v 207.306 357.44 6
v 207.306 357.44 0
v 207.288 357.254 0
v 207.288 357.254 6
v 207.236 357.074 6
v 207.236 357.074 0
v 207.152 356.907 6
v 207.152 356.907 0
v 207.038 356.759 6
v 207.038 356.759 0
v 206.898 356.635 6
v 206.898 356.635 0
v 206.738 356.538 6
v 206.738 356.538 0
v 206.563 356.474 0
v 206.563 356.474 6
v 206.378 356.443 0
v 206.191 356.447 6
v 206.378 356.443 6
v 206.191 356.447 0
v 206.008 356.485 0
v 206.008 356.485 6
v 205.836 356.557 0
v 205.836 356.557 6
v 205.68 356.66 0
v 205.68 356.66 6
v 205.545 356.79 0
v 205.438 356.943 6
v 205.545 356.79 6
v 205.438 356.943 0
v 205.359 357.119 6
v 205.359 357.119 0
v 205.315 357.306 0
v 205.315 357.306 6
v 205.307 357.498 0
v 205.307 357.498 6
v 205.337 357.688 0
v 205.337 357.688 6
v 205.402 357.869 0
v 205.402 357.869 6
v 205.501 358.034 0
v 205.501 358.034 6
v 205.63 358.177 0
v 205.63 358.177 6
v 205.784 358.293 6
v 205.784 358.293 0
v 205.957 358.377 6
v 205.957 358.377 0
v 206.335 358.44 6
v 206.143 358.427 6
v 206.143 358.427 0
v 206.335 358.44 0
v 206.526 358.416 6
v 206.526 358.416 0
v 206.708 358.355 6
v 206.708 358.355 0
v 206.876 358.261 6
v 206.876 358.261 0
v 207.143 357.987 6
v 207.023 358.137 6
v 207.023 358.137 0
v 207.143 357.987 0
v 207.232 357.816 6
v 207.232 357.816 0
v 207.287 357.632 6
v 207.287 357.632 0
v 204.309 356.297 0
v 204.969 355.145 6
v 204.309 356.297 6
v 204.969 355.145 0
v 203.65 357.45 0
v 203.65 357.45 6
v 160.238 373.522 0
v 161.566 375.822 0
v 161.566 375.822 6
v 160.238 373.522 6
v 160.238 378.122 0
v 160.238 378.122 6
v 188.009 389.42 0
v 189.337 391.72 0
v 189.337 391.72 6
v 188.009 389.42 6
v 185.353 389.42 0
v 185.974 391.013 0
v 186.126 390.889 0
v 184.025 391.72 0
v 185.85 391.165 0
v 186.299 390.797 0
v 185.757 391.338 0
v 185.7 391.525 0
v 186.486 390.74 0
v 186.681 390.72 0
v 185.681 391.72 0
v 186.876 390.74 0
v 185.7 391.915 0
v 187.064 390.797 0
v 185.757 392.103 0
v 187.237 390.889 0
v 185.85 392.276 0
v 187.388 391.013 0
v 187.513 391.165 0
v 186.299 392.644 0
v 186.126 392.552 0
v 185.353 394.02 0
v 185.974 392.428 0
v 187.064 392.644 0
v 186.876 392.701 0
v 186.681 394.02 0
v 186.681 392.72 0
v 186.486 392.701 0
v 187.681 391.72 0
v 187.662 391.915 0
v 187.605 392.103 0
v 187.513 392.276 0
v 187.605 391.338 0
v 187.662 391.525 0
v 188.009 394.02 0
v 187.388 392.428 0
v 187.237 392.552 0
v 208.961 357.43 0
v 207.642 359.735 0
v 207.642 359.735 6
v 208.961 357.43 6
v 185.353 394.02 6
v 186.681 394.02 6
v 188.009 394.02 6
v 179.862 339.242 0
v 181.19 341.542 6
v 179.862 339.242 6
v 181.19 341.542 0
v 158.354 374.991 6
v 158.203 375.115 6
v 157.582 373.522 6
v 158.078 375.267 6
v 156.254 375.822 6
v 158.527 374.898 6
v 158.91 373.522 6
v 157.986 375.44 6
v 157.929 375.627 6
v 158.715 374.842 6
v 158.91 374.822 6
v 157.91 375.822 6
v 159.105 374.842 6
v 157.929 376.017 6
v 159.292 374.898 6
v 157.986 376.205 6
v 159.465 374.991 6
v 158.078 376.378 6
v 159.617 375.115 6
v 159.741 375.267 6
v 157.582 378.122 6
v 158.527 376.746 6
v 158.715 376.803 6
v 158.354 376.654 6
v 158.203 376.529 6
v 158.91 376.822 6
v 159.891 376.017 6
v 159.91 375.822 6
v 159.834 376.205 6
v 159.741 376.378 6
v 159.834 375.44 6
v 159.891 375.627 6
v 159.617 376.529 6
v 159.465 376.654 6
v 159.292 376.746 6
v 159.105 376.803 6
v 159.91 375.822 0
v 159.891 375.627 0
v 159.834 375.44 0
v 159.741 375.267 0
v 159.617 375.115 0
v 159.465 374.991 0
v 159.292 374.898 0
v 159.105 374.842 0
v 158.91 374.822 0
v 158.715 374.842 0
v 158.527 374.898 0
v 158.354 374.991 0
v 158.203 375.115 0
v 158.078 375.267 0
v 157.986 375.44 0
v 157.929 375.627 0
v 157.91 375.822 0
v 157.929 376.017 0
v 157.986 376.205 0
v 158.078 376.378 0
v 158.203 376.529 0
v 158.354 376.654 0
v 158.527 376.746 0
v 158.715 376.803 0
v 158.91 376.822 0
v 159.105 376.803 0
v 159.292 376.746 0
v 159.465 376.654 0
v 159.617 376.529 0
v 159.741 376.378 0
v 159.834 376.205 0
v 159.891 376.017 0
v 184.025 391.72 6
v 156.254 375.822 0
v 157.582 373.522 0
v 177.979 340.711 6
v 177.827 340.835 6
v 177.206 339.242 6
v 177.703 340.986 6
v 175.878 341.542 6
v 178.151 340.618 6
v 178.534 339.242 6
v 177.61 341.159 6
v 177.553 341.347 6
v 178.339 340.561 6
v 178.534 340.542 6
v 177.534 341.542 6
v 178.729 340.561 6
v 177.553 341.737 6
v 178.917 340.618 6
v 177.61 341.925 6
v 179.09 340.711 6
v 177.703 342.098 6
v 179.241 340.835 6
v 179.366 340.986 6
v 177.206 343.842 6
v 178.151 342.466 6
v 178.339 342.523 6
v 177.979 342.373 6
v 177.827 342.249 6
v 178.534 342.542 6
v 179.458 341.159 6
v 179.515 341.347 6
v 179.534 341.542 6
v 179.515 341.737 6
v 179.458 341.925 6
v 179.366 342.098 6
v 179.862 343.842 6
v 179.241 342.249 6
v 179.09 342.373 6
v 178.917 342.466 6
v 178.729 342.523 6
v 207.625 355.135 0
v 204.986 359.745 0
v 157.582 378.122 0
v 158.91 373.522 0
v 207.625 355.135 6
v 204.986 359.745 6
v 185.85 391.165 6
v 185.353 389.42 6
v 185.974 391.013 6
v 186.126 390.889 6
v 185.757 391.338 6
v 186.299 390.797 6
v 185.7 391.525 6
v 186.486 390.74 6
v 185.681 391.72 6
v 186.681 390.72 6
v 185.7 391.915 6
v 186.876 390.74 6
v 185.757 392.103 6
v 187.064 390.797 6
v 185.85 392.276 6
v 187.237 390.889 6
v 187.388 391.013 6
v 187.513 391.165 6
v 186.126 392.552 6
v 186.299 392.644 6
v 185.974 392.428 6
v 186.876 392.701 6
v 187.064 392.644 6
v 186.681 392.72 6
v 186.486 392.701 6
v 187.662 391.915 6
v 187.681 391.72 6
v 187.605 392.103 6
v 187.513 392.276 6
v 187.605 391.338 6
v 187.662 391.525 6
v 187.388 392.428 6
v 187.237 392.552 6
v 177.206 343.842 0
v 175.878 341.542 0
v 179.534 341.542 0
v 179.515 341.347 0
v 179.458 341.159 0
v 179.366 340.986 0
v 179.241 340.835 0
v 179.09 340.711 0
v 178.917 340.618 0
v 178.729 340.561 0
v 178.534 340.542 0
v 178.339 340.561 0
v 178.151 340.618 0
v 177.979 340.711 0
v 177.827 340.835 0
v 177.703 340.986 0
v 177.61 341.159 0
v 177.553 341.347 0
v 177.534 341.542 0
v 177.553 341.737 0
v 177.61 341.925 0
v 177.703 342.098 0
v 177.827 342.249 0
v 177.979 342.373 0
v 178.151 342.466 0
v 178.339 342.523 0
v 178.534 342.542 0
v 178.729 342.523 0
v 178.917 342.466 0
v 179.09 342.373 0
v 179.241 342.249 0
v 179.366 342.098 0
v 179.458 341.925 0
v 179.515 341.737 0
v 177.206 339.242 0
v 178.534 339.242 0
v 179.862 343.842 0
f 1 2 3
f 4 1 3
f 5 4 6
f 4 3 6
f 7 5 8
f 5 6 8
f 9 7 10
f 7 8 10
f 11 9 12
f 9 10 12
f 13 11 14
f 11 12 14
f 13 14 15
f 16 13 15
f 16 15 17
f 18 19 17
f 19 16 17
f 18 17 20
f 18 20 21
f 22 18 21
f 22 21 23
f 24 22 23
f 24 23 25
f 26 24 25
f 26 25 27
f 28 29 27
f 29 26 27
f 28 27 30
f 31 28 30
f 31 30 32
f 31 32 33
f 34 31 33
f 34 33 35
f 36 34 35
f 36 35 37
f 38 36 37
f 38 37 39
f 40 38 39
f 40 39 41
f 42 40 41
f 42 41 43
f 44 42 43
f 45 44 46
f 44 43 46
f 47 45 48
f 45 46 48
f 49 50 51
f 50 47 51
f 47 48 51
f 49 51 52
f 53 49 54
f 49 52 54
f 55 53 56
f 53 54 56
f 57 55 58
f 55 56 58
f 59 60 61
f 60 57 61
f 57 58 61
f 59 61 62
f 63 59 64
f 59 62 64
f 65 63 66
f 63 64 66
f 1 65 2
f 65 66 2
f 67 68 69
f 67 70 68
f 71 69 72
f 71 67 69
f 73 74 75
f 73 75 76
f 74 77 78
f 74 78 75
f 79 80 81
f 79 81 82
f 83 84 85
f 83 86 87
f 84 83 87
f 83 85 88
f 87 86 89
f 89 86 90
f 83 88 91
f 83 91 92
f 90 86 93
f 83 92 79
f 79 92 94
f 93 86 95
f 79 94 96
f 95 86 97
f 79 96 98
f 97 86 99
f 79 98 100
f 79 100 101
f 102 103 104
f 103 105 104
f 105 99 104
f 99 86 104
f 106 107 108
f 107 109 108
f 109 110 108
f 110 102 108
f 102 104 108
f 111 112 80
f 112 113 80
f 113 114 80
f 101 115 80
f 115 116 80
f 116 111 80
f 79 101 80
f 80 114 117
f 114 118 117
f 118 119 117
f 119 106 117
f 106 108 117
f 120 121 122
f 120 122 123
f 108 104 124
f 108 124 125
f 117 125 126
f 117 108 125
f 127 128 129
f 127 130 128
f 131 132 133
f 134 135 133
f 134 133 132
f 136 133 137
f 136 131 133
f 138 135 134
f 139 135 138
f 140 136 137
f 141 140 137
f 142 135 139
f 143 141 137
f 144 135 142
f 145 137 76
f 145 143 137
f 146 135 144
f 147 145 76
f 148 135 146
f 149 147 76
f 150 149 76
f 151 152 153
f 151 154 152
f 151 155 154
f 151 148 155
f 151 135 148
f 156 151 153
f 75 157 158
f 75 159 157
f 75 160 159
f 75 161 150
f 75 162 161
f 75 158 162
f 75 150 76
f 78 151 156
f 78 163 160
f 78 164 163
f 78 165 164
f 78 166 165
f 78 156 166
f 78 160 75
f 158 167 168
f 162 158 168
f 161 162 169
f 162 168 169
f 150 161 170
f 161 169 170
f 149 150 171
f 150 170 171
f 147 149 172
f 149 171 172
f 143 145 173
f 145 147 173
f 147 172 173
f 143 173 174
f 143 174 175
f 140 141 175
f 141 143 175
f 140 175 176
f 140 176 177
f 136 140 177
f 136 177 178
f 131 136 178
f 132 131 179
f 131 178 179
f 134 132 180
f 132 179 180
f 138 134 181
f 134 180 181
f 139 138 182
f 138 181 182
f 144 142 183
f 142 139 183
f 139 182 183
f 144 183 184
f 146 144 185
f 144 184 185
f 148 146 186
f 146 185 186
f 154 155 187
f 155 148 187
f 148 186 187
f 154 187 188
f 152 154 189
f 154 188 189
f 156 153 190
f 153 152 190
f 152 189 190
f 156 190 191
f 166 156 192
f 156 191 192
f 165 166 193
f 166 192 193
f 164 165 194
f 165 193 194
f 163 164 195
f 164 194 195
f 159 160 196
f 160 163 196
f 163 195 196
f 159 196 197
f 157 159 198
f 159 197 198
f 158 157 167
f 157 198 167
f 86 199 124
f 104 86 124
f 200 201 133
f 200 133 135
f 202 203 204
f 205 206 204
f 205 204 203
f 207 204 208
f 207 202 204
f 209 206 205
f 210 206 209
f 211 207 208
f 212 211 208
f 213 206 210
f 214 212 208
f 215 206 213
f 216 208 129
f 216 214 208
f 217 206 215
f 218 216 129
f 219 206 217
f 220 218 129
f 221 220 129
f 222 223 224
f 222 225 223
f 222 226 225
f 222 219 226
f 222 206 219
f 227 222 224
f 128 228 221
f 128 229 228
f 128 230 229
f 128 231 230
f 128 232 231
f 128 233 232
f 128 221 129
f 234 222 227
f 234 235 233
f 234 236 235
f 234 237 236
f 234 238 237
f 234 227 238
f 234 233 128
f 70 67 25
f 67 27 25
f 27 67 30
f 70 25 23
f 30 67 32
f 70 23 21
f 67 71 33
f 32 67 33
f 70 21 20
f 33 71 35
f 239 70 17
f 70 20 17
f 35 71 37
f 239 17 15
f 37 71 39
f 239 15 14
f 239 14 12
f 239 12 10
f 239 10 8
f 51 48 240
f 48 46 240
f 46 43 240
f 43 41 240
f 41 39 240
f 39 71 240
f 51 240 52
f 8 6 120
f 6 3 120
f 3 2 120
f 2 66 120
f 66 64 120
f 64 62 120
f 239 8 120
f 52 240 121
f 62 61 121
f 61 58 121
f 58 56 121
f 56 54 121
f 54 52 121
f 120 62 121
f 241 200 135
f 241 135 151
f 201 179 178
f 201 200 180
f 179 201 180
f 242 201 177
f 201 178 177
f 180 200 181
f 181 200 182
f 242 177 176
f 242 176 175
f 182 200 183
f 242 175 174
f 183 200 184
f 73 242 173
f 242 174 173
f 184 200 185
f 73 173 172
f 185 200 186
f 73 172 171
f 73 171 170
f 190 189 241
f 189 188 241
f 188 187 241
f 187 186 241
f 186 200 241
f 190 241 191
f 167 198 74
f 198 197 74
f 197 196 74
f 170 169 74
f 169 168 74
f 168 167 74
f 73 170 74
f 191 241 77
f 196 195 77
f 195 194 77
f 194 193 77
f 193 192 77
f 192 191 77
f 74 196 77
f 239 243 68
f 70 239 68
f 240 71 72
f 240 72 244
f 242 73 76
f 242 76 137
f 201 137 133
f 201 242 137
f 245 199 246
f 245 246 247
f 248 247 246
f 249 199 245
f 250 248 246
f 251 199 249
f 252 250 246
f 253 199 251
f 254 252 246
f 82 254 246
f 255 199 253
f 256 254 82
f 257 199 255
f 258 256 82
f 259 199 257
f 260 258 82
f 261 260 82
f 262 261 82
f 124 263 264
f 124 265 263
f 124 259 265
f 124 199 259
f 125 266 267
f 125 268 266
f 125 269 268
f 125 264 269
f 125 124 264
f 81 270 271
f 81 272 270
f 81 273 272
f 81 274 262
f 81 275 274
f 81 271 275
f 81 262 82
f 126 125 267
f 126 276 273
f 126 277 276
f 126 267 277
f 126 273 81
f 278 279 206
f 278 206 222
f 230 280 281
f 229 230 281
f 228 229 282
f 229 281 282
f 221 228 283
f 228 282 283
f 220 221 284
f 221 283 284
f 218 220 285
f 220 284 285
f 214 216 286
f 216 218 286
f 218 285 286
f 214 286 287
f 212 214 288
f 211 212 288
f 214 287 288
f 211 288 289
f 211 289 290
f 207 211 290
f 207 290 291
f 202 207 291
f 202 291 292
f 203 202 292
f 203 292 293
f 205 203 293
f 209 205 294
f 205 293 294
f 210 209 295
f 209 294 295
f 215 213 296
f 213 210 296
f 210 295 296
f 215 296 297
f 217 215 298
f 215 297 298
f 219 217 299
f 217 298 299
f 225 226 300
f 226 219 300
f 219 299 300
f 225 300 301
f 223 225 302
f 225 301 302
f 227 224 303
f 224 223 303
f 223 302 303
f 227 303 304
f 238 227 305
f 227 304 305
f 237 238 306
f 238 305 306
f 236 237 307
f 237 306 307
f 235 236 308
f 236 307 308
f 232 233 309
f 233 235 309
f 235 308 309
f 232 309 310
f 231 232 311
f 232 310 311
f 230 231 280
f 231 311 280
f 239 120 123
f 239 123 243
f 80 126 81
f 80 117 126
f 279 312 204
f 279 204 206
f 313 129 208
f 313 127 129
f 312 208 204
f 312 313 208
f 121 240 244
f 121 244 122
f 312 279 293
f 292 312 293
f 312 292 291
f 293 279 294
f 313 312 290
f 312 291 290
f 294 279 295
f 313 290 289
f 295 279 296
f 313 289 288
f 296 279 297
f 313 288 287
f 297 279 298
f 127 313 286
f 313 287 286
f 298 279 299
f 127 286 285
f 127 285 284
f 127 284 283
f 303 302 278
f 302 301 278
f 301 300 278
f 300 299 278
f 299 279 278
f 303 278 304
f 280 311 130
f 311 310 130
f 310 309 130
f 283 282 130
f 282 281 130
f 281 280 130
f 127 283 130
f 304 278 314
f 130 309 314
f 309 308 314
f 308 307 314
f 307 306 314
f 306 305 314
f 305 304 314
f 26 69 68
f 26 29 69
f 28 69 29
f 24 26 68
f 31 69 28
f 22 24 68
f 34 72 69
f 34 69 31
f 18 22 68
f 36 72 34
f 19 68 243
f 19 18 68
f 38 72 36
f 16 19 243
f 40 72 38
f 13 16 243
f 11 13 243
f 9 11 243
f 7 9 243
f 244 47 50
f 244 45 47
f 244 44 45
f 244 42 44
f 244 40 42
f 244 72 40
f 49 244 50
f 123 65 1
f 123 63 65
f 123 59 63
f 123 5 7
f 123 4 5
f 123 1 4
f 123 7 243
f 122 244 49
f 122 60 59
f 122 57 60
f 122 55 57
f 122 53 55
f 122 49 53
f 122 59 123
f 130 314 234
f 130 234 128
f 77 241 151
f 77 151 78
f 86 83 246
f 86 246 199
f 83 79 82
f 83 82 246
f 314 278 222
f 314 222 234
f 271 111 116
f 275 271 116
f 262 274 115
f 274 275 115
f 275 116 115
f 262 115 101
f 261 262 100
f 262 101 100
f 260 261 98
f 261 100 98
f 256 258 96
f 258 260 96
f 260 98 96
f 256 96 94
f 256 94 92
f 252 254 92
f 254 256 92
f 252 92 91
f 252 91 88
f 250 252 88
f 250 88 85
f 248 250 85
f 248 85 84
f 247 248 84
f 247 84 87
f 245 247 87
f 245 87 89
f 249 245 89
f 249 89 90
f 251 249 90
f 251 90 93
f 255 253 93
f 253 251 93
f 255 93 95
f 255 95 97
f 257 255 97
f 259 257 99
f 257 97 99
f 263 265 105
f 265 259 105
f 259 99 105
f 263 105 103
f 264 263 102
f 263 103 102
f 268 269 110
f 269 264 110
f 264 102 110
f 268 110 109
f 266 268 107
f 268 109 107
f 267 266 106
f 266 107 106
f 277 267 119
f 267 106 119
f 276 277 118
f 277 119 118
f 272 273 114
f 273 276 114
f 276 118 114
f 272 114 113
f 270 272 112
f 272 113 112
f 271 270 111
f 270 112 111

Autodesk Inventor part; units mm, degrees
ref_plane "YZ Plane" through (0, 0, 0) normal (1, 0, 0) x (0, 1, 0)
ref_plane "XZ Plane" through (0, 0, 0) normal (0, 1, 0) x (-1, 0, 0)
ref_plane "XY Plane" through (0, 0, 0) normal (0, 0, 1) x (1, 0, 0)
sketch "Эскиз1" plane through (0, 0, 0) normal (0, 0, 1) x (1, 0, 0)
  line L0 (188.3541, 393.8303) -> (208.9719, 357.8143) projected
  arc A0 (188.3541, 393.8303) -> (186.3071, 394.3869) centre (187.0523, 393.0851) ccw projected
  line L1 (179.4451, 390.4587) -> (186.3071, 394.3869) projected
  line L2 (183.1303, 384.0212) -> (179.4451, 390.4587) projected
  line L3 (182.954, 383.9203) -> (183.1303, 384.0212) projected
  line L4 (179.2688, 390.3577) -> (182.954, 383.9203) projected
  line L5 (163.8383, 381.5243) -> (179.2688, 390.3577) projected
  line L6 (167.5235, 375.0869) -> (163.8383, 381.5243) projected
  line L7 (167.3471, 374.9859) -> (167.5235, 375.0869) projected
  line L8 (163.6619, 381.4234) -> (167.3471, 374.9859) projected
  line L9 (156.7999, 377.4951) -> (163.6619, 381.4234) projected
  arc A1 (156.7999, 377.4951) -> (156.2434, 375.4481) centre (157.5452, 376.1933) ccw projected
  line L10 (157.9982, 372.3827) -> (156.2434, 375.4481) projected
  arc A2 (157.9982, 372.3827) -> (161.0468, 371.2843) centre (160.1679, 373.6247) ccw projected
  line L11 (175.7028, 345.6825) -> (161.0468, 371.2843) projected
  arc A3 (175.7028, 345.6825) -> (175.1064, 342.4975) centre (177.276, 343.7396) ccw projected
  line L12 (176.8612, 339.4321) -> (175.1064, 342.4975) projected
  arc A4 (176.8612, 339.4321) -> (178.9082, 338.8755) centre (178.163, 340.1773) ccw projected
  line L13 (208.4154, 355.7673) -> (178.9082, 338.8755) projected
  arc A5 (208.4154, 355.7673) -> (208.9719, 357.8143) centre (207.6701, 357.069) ccw projected
  circle A6 centre (178.5341, 341.542) radius 1 projected
  circle A7 centre (188.1353, 346.7502) radius 0.4445 projected
  circle A8 centre (190.3396, 348.0122) radius 0.4445 projected
  circle A9 centre (206.3055, 357.4401) radius 1 projected
  circle A10 centre (194.7483, 350.536) radius 0.4445 projected
  circle A11 centre (158.9098, 375.8223) radius 1 projected
  circle A12 centre (192.544, 349.2741) radius 0.4445 projected
  circle A13 centre (196.9527, 351.7979) radius 0.4445 projected
  circle A14 centre (199.157, 353.0598) radius 0.4445 projected
  circle A15 centre (186.6812, 391.7204) radius 1 projected
  line L14 (182.8151, 357.3203) -> (174.7893, 371.34) projected
  line L15 (182.7868, 357.2163) -> (182.8151, 357.3203) projected
  line L16 (183.8468, 355.3646) -> (182.7868, 357.2163) projected
  line L17 (180.915, 353.6863) -> (183.8468, 355.3646) projected
  line L18 (180.915, 353.6863) -> (181.4829, 352.6943) projected
  line L19 (181.4829, 352.6943) -> (179.7635, 351.71) projected
  line L20 (179.7635, 351.71) -> (178.0978, 354.6198) projected
  line L21 (178.0978, 354.6198) -> (178.6268, 354.9226) projected
  line L22 (170.6137, 368.9203) -> (178.6268, 354.9226) projected
  line L23 (170.6137, 368.9203) -> (170.0846, 368.6174) projected
  line L24 (170.0846, 368.6174) -> (168.4189, 371.5272) projected
  line L25 (168.4189, 371.5272) -> (170.1383, 372.5115) projected
  line L26 (170.1383, 372.5115) -> (170.6935, 371.5415) projected
  line L27 (173.6694, 373.2451) -> (170.6935, 371.5415) projected
  line L28 (173.6411, 373.1411) -> (173.6694, 373.2451) projected
  line L29 (174.7011, 371.2895) -> (173.6411, 373.1411) projected
  line L30 (174.7893, 371.34) -> (174.7011, 371.2895) projected
  circle A16 centre (185.9309, 345.4883) radius 0.4445 projected
  line L31 (186.6812, 391.7204) -> (186.6812, 394.0204)
  line L32 (206.3055, 357.4401) -> (204.3094, 356.2974)
  line L33 (158.9098, 375.8223) -> (158.9098, 373.5223)
  line L34 (178.5341, 341.542) -> (178.5341, 339.242)
  line L35 (157.5819, 373.5223) -> (156.254, 375.8223)
  line L36 (156.254, 375.8223) -> (157.5819, 378.1223)
  line L37 (157.5819, 378.1223) -> (160.2378, 378.1223)
  line L38 (160.2378, 378.1223) -> (161.5657, 375.8223)
  line L39 (161.5657, 375.8223) -> (160.2378, 373.5223)
  line L40 (160.2378, 373.5223) -> (157.5819, 373.5223)
  line L41 (188.0091, 394.0204) -> (189.3371, 391.7204)
  line L42 (189.3371, 391.7204) -> (188.0091, 389.4204)
  line L43 (188.0091, 389.4204) -> (185.3533, 389.4204)
  line L44 (185.3533, 389.4204) -> (184.0254, 391.7204)
  line L45 (184.0254, 391.7204) -> (185.3533, 394.0204)
  line L46 (185.3533, 394.0204) -> (188.0091, 394.0204)
  line L47 (203.6497, 357.4498) -> (204.986, 359.7449)
  line L48 (204.986, 359.7449) -> (207.6418, 359.7352)
  line L49 (207.6418, 359.7352) -> (208.9612, 357.4303)
  line L50 (208.9612, 357.4303) -> (207.6249, 355.1352)
  line L51 (207.6249, 355.1352) -> (204.9691, 355.145)
  line L52 (204.9691, 355.145) -> (203.6497, 357.4498)
  line L53 (177.2062, 339.242) -> (175.8782, 341.542)
  line L54 (175.8782, 341.542) -> (177.2062, 343.842)
  line L55 (177.2062, 343.842) -> (179.862, 343.842)
  line L56 (179.862, 343.842) -> (181.1899, 341.542)
  line L57 (181.1899, 341.542) -> (179.862, 339.242)
  line L58 (179.862, 339.242) -> (177.2062, 339.242)
  point P0 (0, 0)
  dimension "d0" = 2.3
  dimension "d1" = 2.3
  dimension "d2" = 2.3
  dimension "d3" = 2.3
extrude "Выдавливание1" add sketch "Эскиз1" along normal blind 6 contours L46 L41 L42 L43 L44 L45 L1 | L1 L45 L46 | L50 L51 L13 | L13 L51 L52 L47 L48 L49 L50 | L57 L58 L13 | L13 L58 L53 L54 L55 L56 L57 | L37 L38 L39 L40 L35 L36 L9 | L9 L36 L37
properties part number "oled__stoyki"
